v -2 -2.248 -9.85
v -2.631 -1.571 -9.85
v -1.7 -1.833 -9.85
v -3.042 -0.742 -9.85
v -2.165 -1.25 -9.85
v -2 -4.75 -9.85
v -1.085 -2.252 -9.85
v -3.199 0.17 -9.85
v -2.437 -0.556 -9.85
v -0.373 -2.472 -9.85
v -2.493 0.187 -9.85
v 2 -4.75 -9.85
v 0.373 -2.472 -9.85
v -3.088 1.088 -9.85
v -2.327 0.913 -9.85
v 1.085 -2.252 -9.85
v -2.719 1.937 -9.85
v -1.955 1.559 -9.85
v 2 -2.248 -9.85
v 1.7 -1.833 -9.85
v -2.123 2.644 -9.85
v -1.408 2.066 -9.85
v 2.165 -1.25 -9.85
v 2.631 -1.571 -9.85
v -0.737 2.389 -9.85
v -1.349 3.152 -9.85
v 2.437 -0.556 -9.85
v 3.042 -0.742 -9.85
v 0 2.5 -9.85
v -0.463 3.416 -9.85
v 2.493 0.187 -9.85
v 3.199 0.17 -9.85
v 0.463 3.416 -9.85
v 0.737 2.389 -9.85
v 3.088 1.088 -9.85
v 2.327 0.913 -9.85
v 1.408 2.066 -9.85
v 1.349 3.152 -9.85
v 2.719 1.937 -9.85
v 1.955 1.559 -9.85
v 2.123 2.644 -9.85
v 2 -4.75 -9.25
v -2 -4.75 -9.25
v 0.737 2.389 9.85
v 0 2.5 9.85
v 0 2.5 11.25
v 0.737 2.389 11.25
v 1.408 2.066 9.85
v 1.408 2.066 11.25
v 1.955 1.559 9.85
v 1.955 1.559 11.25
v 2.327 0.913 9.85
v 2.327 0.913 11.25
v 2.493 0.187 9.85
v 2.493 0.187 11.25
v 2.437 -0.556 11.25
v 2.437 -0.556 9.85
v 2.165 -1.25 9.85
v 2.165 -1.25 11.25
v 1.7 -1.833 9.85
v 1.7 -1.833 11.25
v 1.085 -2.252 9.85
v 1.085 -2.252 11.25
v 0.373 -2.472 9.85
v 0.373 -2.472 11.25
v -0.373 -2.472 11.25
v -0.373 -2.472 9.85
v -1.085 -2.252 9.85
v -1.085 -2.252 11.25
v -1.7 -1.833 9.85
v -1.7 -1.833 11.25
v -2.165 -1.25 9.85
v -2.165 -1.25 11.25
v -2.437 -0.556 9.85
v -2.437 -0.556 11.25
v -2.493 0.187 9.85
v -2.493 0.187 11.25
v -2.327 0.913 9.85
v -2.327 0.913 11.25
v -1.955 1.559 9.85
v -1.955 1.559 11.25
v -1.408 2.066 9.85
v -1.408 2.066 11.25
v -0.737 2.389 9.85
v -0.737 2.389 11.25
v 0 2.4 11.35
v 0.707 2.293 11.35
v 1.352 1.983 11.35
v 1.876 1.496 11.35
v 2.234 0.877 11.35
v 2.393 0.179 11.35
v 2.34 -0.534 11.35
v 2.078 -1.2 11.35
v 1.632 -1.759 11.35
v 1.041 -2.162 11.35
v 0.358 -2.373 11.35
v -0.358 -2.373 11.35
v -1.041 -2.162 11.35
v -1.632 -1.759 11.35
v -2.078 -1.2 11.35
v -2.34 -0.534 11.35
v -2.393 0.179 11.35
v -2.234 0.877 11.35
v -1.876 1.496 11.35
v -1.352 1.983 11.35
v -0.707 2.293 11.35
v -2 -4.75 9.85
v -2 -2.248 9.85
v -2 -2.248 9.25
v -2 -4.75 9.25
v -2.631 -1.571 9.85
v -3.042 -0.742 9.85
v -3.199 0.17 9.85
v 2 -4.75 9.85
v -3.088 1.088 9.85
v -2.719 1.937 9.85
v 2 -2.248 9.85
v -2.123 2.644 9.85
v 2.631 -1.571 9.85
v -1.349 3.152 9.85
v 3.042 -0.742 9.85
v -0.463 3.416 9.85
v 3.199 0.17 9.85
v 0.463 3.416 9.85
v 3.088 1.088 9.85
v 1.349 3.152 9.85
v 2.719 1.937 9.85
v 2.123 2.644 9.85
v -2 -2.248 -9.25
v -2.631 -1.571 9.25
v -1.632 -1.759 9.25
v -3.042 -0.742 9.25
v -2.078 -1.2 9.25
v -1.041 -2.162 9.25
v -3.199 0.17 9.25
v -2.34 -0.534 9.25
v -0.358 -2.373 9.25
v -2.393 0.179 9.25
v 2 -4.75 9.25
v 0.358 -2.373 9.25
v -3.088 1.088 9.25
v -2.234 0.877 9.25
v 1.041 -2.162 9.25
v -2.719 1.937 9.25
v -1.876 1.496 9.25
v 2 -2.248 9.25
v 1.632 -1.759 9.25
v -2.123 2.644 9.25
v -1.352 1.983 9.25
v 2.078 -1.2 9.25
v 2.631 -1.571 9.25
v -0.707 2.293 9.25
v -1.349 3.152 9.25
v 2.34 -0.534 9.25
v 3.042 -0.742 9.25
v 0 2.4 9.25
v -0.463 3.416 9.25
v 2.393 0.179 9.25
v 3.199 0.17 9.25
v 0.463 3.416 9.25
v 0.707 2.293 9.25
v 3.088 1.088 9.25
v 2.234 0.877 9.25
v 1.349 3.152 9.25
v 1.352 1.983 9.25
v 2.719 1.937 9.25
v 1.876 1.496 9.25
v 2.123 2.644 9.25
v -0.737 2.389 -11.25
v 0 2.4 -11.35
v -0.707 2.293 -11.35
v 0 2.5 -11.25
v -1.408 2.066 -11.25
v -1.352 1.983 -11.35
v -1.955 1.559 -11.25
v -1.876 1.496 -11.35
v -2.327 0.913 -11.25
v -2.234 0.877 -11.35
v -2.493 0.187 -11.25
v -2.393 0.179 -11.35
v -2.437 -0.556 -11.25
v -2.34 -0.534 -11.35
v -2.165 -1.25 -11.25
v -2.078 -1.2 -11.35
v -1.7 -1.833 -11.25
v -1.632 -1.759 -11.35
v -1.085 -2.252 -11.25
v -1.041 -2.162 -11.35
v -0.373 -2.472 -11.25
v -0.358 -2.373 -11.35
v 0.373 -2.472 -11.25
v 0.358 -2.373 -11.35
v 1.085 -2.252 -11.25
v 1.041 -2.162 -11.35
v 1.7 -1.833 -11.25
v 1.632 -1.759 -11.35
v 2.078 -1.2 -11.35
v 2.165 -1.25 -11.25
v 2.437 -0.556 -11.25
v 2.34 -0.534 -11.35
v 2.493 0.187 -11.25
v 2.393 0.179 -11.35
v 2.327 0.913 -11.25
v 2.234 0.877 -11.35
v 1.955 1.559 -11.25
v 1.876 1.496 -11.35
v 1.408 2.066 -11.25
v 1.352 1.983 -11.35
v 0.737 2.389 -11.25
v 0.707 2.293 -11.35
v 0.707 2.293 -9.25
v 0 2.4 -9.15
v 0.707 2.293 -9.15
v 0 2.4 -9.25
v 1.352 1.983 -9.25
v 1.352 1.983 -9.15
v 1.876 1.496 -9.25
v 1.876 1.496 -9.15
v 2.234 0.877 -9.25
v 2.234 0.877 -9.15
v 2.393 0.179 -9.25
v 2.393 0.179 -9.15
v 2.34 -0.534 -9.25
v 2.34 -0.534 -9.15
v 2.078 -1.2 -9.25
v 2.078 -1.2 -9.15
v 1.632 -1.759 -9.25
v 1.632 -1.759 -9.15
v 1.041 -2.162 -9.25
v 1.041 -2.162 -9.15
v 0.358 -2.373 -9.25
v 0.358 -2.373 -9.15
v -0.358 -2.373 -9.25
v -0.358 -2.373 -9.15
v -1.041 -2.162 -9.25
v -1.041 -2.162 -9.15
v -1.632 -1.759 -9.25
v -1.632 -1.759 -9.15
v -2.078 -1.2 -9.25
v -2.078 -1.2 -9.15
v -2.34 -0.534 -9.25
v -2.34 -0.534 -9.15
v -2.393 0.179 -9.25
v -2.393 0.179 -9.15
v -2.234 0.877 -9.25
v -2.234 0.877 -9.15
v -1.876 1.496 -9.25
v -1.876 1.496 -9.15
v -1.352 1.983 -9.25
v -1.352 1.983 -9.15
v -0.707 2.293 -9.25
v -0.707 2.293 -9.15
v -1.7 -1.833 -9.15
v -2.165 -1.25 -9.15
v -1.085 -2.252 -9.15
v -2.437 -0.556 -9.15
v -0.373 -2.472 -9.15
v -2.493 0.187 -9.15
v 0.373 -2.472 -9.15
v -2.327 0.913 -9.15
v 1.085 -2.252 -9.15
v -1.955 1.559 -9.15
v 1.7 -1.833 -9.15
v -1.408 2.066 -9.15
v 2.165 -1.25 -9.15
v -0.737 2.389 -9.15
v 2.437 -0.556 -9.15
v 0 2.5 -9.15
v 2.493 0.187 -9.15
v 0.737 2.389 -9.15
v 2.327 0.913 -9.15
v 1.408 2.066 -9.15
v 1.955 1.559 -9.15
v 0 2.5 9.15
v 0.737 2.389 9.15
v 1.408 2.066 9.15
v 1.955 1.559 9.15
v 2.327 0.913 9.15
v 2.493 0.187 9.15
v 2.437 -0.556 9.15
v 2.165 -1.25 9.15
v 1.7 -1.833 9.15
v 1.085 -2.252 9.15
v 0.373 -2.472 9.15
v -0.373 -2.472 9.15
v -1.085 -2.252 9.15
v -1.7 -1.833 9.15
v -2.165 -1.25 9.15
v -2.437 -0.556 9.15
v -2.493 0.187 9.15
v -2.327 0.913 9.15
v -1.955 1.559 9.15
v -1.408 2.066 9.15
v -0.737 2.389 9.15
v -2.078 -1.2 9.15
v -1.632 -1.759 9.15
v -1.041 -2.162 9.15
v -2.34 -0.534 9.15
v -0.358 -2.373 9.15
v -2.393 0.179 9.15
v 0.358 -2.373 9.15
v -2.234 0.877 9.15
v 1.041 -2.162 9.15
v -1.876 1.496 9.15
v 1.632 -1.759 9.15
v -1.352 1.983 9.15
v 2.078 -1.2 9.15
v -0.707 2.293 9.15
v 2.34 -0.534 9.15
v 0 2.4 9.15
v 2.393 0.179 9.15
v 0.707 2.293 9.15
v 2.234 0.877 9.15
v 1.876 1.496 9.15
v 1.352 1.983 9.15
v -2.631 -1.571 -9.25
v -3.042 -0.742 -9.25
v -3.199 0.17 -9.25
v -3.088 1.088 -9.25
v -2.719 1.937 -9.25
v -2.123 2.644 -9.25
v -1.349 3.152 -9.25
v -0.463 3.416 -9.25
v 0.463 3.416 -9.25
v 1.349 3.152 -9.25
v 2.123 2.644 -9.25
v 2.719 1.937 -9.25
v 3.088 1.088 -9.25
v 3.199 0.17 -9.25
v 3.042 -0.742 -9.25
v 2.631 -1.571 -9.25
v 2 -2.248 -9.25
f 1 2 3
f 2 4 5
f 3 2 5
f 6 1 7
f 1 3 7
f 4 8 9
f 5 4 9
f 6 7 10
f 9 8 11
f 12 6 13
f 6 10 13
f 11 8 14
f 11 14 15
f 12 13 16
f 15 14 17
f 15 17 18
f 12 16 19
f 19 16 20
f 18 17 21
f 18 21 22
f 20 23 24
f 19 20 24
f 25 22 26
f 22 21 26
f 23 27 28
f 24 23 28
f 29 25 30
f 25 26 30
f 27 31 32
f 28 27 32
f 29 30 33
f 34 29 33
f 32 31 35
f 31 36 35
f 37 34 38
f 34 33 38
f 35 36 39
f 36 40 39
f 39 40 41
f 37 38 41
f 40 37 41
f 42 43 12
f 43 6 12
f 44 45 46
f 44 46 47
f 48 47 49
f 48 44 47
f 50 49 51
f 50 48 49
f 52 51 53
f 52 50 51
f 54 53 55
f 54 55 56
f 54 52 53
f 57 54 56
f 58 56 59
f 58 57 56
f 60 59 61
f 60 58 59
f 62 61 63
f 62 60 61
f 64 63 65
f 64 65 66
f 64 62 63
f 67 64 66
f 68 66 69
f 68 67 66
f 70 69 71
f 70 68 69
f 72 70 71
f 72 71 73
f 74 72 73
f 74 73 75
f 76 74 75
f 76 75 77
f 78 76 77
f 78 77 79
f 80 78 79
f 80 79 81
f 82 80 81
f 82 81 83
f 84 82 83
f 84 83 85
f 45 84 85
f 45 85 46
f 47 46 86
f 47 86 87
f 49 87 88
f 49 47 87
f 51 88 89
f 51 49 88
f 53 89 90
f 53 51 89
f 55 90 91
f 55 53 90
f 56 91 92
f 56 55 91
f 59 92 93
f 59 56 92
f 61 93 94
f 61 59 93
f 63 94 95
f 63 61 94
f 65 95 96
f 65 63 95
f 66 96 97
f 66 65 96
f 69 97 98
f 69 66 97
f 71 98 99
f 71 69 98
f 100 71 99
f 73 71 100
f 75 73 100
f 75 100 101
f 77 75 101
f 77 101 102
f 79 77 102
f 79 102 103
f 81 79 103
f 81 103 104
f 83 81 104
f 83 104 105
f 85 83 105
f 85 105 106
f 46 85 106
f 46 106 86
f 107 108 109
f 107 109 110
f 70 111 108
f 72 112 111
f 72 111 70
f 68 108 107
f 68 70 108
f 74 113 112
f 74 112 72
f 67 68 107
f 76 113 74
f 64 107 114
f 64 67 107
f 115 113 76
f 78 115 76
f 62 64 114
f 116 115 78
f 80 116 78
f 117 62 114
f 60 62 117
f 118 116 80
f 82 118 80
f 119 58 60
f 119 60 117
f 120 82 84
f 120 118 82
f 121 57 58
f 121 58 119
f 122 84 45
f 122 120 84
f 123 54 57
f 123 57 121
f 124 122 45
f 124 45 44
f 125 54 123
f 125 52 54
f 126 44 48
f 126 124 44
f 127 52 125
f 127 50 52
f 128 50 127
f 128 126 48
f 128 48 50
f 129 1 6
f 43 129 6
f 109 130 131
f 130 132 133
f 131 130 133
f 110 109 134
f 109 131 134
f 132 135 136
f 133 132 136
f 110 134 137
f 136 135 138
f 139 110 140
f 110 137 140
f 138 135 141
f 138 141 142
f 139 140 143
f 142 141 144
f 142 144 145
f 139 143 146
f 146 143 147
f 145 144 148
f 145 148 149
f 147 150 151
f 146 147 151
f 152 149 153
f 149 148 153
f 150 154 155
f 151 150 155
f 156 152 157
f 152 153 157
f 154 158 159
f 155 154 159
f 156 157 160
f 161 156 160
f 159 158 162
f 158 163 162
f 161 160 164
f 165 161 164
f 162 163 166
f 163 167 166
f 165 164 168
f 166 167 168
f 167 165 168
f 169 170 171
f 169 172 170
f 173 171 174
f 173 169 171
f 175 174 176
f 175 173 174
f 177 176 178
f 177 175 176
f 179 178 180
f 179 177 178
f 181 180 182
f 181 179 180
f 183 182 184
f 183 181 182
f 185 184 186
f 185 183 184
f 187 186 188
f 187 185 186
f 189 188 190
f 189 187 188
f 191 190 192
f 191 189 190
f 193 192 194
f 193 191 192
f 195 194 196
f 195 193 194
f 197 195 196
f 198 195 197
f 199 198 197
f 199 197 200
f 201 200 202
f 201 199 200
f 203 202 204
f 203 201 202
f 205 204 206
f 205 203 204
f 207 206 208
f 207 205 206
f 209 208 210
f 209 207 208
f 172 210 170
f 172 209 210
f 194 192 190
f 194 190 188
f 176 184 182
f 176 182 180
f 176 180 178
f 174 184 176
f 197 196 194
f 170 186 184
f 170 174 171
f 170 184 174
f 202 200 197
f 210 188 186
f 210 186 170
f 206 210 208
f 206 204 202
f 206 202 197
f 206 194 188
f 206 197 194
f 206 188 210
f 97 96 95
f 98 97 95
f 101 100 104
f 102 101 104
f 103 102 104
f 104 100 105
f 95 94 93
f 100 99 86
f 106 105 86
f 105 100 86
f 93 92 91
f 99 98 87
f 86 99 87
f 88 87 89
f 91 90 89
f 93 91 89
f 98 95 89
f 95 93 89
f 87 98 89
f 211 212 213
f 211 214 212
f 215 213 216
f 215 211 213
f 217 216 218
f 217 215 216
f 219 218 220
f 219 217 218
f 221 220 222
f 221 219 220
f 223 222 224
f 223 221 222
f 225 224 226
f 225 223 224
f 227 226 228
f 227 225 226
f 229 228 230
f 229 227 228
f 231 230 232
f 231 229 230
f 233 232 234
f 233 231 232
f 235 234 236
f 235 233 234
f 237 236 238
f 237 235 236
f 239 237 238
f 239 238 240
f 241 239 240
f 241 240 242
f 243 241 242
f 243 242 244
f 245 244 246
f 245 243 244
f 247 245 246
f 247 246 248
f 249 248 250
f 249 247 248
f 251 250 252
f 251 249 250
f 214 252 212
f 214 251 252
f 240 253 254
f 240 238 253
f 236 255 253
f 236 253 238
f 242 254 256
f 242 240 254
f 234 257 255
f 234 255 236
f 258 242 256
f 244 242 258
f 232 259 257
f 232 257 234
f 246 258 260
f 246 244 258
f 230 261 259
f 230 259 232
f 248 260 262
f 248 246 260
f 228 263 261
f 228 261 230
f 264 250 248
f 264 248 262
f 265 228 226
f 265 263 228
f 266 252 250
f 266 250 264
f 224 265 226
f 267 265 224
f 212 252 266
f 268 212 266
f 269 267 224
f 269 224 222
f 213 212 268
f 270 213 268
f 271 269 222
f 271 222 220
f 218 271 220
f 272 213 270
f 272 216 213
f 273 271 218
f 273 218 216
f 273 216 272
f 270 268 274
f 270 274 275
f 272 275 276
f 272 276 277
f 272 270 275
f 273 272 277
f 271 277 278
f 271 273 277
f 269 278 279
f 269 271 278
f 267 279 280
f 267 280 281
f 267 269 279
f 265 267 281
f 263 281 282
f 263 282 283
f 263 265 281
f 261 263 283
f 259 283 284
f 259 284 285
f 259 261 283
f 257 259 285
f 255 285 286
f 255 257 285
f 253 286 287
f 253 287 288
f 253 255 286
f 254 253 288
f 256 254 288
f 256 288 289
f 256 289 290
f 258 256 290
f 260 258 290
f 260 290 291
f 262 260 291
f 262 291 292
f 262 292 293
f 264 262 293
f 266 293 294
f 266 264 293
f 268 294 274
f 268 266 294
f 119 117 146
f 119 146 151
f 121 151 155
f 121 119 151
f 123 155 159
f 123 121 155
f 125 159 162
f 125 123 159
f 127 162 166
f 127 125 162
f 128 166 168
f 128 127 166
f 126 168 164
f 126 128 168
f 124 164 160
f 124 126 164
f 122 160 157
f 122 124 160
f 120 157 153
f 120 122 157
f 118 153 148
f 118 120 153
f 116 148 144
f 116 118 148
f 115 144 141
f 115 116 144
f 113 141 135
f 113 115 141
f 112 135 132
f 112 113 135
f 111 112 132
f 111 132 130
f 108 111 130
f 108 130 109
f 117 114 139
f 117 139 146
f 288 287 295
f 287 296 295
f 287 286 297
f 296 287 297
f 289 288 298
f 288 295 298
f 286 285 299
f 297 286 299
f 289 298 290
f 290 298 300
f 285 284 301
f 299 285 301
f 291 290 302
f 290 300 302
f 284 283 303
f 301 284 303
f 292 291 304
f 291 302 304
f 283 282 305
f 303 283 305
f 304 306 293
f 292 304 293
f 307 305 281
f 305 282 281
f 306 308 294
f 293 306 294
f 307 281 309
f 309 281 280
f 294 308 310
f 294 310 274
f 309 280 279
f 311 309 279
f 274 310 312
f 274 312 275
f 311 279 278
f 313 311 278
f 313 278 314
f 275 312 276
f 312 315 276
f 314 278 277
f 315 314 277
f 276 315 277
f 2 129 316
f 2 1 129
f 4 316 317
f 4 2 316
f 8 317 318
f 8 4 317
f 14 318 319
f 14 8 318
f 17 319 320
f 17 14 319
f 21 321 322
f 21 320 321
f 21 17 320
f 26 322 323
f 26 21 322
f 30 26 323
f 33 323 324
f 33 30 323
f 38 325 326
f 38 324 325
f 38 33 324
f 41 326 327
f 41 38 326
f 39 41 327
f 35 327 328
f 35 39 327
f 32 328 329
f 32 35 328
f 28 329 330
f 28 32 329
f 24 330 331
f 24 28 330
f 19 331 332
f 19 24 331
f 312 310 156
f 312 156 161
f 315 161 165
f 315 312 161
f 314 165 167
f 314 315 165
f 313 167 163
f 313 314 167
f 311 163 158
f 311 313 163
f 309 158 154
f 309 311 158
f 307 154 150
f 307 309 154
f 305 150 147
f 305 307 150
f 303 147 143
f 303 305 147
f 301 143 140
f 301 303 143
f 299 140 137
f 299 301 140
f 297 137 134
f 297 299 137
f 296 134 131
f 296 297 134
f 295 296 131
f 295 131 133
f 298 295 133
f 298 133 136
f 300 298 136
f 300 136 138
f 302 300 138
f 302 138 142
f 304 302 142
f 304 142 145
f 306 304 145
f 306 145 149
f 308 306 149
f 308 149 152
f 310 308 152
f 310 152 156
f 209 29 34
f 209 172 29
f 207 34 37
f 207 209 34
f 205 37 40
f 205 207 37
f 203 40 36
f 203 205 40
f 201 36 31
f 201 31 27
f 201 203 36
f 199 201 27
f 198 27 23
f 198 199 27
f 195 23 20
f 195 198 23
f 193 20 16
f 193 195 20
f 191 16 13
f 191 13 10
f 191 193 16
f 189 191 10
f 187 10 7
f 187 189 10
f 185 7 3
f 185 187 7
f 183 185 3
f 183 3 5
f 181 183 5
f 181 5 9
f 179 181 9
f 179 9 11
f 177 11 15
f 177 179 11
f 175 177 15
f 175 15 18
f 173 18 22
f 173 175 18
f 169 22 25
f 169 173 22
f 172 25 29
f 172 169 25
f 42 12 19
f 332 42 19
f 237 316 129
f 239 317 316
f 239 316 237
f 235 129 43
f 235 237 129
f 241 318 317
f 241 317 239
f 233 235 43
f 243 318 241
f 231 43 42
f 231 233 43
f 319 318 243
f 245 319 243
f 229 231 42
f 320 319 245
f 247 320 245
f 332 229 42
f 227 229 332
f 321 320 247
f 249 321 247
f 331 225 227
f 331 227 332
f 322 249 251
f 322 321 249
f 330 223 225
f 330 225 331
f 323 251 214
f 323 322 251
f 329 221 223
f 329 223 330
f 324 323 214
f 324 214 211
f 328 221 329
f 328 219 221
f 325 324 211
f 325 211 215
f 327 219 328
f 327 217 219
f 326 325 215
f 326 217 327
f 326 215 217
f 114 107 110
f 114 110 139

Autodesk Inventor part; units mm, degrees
sketch "Sketch_1" plane through (0, 0, 0) normal (1, 0, 0) x (0, 1, 0)
  line L0 (0, -50) -> (0, 50)
  line L1 (0, 11.35) -> (2.4, 11.35)
  line L2 (2.4, 11.35) -> (2.5, 11.25)
  line L3 (2.5, 11.25) -> (2.5, 9.85)
  line L4 (2.5, 9.85) -> (2.4, 9.85)
  line L5 (2.4, 9.85) -> (2.4, 9.15)
  line L6 (2.4, 9.15) -> (2.5, 9.15)
  line L7 (2.5, 9.15) -> (2.5, -9.15)
  line L8 (2.5, -9.15) -> (2.4, -9.15)
  line L9 (2.4, -9.15) -> (2.4, -9.85)
  line L10 (2.4, -9.85) -> (2.5, -9.85)
  line L11 (2.5, -9.85) -> (2.5, -11.25)
  line L12 (2.5, -11.25) -> (2.4, -11.35)
  line L13 (2.4, -11.35) -> (0, -11.35)
  line L14 (0, -11.35) -> (0, 11.35)
revolve "Revolution1" add sketch "Sketch_1" angle 360 about axis through (0, 0, -50) along (0, 0, -1)
sketch "Sketch_4" plane through (0, 0, 9.85) normal (0, 0, 1) x (1, 0, 0)
  arc A0 (2, -2.248) -> (-2, -2.248) centre (0, 0.25) ccw
  line L0 (-2, -2.248) -> (-2, -4.75)
  line L1 (-2, -4.75) -> (2, -4.75)
  line L2 (2, -4.75) -> (2, -2.248)
extrude "Extrusion1" add sketch "Sketch_4" against normal blind 0.6
sketch "Sketch_5" plane through (0, 0, -9.85) normal (0, 0, 1) x (1, 0, 0)
  arc A0 (2, -2.248) -> (-2, -2.248) centre (0, 0.25) ccw
  line L0 (-2, -2.248) -> (-2, -4.75)
  line L1 (-2, -4.75) -> (2, -4.75)
  line L2 (2, -4.75) -> (2, -2.248)
extrude "Extrusion2" add sketch "Sketch_5" along normal blind 0.6
ref_plane "cd_XY" through (0, 0, 0) normal (1, 0, 0) x (0, 0, -1)
ref_plane "cd_YZ" through (0, 0, 0) normal (0, 0, -1) x (0, 1, 0)
ref_plane "cd_ZX" through (0, 0, 0) normal (0, 1, 0) x (1, 0, 0)
properties part number "CJ2-Z_CD-Z015"
